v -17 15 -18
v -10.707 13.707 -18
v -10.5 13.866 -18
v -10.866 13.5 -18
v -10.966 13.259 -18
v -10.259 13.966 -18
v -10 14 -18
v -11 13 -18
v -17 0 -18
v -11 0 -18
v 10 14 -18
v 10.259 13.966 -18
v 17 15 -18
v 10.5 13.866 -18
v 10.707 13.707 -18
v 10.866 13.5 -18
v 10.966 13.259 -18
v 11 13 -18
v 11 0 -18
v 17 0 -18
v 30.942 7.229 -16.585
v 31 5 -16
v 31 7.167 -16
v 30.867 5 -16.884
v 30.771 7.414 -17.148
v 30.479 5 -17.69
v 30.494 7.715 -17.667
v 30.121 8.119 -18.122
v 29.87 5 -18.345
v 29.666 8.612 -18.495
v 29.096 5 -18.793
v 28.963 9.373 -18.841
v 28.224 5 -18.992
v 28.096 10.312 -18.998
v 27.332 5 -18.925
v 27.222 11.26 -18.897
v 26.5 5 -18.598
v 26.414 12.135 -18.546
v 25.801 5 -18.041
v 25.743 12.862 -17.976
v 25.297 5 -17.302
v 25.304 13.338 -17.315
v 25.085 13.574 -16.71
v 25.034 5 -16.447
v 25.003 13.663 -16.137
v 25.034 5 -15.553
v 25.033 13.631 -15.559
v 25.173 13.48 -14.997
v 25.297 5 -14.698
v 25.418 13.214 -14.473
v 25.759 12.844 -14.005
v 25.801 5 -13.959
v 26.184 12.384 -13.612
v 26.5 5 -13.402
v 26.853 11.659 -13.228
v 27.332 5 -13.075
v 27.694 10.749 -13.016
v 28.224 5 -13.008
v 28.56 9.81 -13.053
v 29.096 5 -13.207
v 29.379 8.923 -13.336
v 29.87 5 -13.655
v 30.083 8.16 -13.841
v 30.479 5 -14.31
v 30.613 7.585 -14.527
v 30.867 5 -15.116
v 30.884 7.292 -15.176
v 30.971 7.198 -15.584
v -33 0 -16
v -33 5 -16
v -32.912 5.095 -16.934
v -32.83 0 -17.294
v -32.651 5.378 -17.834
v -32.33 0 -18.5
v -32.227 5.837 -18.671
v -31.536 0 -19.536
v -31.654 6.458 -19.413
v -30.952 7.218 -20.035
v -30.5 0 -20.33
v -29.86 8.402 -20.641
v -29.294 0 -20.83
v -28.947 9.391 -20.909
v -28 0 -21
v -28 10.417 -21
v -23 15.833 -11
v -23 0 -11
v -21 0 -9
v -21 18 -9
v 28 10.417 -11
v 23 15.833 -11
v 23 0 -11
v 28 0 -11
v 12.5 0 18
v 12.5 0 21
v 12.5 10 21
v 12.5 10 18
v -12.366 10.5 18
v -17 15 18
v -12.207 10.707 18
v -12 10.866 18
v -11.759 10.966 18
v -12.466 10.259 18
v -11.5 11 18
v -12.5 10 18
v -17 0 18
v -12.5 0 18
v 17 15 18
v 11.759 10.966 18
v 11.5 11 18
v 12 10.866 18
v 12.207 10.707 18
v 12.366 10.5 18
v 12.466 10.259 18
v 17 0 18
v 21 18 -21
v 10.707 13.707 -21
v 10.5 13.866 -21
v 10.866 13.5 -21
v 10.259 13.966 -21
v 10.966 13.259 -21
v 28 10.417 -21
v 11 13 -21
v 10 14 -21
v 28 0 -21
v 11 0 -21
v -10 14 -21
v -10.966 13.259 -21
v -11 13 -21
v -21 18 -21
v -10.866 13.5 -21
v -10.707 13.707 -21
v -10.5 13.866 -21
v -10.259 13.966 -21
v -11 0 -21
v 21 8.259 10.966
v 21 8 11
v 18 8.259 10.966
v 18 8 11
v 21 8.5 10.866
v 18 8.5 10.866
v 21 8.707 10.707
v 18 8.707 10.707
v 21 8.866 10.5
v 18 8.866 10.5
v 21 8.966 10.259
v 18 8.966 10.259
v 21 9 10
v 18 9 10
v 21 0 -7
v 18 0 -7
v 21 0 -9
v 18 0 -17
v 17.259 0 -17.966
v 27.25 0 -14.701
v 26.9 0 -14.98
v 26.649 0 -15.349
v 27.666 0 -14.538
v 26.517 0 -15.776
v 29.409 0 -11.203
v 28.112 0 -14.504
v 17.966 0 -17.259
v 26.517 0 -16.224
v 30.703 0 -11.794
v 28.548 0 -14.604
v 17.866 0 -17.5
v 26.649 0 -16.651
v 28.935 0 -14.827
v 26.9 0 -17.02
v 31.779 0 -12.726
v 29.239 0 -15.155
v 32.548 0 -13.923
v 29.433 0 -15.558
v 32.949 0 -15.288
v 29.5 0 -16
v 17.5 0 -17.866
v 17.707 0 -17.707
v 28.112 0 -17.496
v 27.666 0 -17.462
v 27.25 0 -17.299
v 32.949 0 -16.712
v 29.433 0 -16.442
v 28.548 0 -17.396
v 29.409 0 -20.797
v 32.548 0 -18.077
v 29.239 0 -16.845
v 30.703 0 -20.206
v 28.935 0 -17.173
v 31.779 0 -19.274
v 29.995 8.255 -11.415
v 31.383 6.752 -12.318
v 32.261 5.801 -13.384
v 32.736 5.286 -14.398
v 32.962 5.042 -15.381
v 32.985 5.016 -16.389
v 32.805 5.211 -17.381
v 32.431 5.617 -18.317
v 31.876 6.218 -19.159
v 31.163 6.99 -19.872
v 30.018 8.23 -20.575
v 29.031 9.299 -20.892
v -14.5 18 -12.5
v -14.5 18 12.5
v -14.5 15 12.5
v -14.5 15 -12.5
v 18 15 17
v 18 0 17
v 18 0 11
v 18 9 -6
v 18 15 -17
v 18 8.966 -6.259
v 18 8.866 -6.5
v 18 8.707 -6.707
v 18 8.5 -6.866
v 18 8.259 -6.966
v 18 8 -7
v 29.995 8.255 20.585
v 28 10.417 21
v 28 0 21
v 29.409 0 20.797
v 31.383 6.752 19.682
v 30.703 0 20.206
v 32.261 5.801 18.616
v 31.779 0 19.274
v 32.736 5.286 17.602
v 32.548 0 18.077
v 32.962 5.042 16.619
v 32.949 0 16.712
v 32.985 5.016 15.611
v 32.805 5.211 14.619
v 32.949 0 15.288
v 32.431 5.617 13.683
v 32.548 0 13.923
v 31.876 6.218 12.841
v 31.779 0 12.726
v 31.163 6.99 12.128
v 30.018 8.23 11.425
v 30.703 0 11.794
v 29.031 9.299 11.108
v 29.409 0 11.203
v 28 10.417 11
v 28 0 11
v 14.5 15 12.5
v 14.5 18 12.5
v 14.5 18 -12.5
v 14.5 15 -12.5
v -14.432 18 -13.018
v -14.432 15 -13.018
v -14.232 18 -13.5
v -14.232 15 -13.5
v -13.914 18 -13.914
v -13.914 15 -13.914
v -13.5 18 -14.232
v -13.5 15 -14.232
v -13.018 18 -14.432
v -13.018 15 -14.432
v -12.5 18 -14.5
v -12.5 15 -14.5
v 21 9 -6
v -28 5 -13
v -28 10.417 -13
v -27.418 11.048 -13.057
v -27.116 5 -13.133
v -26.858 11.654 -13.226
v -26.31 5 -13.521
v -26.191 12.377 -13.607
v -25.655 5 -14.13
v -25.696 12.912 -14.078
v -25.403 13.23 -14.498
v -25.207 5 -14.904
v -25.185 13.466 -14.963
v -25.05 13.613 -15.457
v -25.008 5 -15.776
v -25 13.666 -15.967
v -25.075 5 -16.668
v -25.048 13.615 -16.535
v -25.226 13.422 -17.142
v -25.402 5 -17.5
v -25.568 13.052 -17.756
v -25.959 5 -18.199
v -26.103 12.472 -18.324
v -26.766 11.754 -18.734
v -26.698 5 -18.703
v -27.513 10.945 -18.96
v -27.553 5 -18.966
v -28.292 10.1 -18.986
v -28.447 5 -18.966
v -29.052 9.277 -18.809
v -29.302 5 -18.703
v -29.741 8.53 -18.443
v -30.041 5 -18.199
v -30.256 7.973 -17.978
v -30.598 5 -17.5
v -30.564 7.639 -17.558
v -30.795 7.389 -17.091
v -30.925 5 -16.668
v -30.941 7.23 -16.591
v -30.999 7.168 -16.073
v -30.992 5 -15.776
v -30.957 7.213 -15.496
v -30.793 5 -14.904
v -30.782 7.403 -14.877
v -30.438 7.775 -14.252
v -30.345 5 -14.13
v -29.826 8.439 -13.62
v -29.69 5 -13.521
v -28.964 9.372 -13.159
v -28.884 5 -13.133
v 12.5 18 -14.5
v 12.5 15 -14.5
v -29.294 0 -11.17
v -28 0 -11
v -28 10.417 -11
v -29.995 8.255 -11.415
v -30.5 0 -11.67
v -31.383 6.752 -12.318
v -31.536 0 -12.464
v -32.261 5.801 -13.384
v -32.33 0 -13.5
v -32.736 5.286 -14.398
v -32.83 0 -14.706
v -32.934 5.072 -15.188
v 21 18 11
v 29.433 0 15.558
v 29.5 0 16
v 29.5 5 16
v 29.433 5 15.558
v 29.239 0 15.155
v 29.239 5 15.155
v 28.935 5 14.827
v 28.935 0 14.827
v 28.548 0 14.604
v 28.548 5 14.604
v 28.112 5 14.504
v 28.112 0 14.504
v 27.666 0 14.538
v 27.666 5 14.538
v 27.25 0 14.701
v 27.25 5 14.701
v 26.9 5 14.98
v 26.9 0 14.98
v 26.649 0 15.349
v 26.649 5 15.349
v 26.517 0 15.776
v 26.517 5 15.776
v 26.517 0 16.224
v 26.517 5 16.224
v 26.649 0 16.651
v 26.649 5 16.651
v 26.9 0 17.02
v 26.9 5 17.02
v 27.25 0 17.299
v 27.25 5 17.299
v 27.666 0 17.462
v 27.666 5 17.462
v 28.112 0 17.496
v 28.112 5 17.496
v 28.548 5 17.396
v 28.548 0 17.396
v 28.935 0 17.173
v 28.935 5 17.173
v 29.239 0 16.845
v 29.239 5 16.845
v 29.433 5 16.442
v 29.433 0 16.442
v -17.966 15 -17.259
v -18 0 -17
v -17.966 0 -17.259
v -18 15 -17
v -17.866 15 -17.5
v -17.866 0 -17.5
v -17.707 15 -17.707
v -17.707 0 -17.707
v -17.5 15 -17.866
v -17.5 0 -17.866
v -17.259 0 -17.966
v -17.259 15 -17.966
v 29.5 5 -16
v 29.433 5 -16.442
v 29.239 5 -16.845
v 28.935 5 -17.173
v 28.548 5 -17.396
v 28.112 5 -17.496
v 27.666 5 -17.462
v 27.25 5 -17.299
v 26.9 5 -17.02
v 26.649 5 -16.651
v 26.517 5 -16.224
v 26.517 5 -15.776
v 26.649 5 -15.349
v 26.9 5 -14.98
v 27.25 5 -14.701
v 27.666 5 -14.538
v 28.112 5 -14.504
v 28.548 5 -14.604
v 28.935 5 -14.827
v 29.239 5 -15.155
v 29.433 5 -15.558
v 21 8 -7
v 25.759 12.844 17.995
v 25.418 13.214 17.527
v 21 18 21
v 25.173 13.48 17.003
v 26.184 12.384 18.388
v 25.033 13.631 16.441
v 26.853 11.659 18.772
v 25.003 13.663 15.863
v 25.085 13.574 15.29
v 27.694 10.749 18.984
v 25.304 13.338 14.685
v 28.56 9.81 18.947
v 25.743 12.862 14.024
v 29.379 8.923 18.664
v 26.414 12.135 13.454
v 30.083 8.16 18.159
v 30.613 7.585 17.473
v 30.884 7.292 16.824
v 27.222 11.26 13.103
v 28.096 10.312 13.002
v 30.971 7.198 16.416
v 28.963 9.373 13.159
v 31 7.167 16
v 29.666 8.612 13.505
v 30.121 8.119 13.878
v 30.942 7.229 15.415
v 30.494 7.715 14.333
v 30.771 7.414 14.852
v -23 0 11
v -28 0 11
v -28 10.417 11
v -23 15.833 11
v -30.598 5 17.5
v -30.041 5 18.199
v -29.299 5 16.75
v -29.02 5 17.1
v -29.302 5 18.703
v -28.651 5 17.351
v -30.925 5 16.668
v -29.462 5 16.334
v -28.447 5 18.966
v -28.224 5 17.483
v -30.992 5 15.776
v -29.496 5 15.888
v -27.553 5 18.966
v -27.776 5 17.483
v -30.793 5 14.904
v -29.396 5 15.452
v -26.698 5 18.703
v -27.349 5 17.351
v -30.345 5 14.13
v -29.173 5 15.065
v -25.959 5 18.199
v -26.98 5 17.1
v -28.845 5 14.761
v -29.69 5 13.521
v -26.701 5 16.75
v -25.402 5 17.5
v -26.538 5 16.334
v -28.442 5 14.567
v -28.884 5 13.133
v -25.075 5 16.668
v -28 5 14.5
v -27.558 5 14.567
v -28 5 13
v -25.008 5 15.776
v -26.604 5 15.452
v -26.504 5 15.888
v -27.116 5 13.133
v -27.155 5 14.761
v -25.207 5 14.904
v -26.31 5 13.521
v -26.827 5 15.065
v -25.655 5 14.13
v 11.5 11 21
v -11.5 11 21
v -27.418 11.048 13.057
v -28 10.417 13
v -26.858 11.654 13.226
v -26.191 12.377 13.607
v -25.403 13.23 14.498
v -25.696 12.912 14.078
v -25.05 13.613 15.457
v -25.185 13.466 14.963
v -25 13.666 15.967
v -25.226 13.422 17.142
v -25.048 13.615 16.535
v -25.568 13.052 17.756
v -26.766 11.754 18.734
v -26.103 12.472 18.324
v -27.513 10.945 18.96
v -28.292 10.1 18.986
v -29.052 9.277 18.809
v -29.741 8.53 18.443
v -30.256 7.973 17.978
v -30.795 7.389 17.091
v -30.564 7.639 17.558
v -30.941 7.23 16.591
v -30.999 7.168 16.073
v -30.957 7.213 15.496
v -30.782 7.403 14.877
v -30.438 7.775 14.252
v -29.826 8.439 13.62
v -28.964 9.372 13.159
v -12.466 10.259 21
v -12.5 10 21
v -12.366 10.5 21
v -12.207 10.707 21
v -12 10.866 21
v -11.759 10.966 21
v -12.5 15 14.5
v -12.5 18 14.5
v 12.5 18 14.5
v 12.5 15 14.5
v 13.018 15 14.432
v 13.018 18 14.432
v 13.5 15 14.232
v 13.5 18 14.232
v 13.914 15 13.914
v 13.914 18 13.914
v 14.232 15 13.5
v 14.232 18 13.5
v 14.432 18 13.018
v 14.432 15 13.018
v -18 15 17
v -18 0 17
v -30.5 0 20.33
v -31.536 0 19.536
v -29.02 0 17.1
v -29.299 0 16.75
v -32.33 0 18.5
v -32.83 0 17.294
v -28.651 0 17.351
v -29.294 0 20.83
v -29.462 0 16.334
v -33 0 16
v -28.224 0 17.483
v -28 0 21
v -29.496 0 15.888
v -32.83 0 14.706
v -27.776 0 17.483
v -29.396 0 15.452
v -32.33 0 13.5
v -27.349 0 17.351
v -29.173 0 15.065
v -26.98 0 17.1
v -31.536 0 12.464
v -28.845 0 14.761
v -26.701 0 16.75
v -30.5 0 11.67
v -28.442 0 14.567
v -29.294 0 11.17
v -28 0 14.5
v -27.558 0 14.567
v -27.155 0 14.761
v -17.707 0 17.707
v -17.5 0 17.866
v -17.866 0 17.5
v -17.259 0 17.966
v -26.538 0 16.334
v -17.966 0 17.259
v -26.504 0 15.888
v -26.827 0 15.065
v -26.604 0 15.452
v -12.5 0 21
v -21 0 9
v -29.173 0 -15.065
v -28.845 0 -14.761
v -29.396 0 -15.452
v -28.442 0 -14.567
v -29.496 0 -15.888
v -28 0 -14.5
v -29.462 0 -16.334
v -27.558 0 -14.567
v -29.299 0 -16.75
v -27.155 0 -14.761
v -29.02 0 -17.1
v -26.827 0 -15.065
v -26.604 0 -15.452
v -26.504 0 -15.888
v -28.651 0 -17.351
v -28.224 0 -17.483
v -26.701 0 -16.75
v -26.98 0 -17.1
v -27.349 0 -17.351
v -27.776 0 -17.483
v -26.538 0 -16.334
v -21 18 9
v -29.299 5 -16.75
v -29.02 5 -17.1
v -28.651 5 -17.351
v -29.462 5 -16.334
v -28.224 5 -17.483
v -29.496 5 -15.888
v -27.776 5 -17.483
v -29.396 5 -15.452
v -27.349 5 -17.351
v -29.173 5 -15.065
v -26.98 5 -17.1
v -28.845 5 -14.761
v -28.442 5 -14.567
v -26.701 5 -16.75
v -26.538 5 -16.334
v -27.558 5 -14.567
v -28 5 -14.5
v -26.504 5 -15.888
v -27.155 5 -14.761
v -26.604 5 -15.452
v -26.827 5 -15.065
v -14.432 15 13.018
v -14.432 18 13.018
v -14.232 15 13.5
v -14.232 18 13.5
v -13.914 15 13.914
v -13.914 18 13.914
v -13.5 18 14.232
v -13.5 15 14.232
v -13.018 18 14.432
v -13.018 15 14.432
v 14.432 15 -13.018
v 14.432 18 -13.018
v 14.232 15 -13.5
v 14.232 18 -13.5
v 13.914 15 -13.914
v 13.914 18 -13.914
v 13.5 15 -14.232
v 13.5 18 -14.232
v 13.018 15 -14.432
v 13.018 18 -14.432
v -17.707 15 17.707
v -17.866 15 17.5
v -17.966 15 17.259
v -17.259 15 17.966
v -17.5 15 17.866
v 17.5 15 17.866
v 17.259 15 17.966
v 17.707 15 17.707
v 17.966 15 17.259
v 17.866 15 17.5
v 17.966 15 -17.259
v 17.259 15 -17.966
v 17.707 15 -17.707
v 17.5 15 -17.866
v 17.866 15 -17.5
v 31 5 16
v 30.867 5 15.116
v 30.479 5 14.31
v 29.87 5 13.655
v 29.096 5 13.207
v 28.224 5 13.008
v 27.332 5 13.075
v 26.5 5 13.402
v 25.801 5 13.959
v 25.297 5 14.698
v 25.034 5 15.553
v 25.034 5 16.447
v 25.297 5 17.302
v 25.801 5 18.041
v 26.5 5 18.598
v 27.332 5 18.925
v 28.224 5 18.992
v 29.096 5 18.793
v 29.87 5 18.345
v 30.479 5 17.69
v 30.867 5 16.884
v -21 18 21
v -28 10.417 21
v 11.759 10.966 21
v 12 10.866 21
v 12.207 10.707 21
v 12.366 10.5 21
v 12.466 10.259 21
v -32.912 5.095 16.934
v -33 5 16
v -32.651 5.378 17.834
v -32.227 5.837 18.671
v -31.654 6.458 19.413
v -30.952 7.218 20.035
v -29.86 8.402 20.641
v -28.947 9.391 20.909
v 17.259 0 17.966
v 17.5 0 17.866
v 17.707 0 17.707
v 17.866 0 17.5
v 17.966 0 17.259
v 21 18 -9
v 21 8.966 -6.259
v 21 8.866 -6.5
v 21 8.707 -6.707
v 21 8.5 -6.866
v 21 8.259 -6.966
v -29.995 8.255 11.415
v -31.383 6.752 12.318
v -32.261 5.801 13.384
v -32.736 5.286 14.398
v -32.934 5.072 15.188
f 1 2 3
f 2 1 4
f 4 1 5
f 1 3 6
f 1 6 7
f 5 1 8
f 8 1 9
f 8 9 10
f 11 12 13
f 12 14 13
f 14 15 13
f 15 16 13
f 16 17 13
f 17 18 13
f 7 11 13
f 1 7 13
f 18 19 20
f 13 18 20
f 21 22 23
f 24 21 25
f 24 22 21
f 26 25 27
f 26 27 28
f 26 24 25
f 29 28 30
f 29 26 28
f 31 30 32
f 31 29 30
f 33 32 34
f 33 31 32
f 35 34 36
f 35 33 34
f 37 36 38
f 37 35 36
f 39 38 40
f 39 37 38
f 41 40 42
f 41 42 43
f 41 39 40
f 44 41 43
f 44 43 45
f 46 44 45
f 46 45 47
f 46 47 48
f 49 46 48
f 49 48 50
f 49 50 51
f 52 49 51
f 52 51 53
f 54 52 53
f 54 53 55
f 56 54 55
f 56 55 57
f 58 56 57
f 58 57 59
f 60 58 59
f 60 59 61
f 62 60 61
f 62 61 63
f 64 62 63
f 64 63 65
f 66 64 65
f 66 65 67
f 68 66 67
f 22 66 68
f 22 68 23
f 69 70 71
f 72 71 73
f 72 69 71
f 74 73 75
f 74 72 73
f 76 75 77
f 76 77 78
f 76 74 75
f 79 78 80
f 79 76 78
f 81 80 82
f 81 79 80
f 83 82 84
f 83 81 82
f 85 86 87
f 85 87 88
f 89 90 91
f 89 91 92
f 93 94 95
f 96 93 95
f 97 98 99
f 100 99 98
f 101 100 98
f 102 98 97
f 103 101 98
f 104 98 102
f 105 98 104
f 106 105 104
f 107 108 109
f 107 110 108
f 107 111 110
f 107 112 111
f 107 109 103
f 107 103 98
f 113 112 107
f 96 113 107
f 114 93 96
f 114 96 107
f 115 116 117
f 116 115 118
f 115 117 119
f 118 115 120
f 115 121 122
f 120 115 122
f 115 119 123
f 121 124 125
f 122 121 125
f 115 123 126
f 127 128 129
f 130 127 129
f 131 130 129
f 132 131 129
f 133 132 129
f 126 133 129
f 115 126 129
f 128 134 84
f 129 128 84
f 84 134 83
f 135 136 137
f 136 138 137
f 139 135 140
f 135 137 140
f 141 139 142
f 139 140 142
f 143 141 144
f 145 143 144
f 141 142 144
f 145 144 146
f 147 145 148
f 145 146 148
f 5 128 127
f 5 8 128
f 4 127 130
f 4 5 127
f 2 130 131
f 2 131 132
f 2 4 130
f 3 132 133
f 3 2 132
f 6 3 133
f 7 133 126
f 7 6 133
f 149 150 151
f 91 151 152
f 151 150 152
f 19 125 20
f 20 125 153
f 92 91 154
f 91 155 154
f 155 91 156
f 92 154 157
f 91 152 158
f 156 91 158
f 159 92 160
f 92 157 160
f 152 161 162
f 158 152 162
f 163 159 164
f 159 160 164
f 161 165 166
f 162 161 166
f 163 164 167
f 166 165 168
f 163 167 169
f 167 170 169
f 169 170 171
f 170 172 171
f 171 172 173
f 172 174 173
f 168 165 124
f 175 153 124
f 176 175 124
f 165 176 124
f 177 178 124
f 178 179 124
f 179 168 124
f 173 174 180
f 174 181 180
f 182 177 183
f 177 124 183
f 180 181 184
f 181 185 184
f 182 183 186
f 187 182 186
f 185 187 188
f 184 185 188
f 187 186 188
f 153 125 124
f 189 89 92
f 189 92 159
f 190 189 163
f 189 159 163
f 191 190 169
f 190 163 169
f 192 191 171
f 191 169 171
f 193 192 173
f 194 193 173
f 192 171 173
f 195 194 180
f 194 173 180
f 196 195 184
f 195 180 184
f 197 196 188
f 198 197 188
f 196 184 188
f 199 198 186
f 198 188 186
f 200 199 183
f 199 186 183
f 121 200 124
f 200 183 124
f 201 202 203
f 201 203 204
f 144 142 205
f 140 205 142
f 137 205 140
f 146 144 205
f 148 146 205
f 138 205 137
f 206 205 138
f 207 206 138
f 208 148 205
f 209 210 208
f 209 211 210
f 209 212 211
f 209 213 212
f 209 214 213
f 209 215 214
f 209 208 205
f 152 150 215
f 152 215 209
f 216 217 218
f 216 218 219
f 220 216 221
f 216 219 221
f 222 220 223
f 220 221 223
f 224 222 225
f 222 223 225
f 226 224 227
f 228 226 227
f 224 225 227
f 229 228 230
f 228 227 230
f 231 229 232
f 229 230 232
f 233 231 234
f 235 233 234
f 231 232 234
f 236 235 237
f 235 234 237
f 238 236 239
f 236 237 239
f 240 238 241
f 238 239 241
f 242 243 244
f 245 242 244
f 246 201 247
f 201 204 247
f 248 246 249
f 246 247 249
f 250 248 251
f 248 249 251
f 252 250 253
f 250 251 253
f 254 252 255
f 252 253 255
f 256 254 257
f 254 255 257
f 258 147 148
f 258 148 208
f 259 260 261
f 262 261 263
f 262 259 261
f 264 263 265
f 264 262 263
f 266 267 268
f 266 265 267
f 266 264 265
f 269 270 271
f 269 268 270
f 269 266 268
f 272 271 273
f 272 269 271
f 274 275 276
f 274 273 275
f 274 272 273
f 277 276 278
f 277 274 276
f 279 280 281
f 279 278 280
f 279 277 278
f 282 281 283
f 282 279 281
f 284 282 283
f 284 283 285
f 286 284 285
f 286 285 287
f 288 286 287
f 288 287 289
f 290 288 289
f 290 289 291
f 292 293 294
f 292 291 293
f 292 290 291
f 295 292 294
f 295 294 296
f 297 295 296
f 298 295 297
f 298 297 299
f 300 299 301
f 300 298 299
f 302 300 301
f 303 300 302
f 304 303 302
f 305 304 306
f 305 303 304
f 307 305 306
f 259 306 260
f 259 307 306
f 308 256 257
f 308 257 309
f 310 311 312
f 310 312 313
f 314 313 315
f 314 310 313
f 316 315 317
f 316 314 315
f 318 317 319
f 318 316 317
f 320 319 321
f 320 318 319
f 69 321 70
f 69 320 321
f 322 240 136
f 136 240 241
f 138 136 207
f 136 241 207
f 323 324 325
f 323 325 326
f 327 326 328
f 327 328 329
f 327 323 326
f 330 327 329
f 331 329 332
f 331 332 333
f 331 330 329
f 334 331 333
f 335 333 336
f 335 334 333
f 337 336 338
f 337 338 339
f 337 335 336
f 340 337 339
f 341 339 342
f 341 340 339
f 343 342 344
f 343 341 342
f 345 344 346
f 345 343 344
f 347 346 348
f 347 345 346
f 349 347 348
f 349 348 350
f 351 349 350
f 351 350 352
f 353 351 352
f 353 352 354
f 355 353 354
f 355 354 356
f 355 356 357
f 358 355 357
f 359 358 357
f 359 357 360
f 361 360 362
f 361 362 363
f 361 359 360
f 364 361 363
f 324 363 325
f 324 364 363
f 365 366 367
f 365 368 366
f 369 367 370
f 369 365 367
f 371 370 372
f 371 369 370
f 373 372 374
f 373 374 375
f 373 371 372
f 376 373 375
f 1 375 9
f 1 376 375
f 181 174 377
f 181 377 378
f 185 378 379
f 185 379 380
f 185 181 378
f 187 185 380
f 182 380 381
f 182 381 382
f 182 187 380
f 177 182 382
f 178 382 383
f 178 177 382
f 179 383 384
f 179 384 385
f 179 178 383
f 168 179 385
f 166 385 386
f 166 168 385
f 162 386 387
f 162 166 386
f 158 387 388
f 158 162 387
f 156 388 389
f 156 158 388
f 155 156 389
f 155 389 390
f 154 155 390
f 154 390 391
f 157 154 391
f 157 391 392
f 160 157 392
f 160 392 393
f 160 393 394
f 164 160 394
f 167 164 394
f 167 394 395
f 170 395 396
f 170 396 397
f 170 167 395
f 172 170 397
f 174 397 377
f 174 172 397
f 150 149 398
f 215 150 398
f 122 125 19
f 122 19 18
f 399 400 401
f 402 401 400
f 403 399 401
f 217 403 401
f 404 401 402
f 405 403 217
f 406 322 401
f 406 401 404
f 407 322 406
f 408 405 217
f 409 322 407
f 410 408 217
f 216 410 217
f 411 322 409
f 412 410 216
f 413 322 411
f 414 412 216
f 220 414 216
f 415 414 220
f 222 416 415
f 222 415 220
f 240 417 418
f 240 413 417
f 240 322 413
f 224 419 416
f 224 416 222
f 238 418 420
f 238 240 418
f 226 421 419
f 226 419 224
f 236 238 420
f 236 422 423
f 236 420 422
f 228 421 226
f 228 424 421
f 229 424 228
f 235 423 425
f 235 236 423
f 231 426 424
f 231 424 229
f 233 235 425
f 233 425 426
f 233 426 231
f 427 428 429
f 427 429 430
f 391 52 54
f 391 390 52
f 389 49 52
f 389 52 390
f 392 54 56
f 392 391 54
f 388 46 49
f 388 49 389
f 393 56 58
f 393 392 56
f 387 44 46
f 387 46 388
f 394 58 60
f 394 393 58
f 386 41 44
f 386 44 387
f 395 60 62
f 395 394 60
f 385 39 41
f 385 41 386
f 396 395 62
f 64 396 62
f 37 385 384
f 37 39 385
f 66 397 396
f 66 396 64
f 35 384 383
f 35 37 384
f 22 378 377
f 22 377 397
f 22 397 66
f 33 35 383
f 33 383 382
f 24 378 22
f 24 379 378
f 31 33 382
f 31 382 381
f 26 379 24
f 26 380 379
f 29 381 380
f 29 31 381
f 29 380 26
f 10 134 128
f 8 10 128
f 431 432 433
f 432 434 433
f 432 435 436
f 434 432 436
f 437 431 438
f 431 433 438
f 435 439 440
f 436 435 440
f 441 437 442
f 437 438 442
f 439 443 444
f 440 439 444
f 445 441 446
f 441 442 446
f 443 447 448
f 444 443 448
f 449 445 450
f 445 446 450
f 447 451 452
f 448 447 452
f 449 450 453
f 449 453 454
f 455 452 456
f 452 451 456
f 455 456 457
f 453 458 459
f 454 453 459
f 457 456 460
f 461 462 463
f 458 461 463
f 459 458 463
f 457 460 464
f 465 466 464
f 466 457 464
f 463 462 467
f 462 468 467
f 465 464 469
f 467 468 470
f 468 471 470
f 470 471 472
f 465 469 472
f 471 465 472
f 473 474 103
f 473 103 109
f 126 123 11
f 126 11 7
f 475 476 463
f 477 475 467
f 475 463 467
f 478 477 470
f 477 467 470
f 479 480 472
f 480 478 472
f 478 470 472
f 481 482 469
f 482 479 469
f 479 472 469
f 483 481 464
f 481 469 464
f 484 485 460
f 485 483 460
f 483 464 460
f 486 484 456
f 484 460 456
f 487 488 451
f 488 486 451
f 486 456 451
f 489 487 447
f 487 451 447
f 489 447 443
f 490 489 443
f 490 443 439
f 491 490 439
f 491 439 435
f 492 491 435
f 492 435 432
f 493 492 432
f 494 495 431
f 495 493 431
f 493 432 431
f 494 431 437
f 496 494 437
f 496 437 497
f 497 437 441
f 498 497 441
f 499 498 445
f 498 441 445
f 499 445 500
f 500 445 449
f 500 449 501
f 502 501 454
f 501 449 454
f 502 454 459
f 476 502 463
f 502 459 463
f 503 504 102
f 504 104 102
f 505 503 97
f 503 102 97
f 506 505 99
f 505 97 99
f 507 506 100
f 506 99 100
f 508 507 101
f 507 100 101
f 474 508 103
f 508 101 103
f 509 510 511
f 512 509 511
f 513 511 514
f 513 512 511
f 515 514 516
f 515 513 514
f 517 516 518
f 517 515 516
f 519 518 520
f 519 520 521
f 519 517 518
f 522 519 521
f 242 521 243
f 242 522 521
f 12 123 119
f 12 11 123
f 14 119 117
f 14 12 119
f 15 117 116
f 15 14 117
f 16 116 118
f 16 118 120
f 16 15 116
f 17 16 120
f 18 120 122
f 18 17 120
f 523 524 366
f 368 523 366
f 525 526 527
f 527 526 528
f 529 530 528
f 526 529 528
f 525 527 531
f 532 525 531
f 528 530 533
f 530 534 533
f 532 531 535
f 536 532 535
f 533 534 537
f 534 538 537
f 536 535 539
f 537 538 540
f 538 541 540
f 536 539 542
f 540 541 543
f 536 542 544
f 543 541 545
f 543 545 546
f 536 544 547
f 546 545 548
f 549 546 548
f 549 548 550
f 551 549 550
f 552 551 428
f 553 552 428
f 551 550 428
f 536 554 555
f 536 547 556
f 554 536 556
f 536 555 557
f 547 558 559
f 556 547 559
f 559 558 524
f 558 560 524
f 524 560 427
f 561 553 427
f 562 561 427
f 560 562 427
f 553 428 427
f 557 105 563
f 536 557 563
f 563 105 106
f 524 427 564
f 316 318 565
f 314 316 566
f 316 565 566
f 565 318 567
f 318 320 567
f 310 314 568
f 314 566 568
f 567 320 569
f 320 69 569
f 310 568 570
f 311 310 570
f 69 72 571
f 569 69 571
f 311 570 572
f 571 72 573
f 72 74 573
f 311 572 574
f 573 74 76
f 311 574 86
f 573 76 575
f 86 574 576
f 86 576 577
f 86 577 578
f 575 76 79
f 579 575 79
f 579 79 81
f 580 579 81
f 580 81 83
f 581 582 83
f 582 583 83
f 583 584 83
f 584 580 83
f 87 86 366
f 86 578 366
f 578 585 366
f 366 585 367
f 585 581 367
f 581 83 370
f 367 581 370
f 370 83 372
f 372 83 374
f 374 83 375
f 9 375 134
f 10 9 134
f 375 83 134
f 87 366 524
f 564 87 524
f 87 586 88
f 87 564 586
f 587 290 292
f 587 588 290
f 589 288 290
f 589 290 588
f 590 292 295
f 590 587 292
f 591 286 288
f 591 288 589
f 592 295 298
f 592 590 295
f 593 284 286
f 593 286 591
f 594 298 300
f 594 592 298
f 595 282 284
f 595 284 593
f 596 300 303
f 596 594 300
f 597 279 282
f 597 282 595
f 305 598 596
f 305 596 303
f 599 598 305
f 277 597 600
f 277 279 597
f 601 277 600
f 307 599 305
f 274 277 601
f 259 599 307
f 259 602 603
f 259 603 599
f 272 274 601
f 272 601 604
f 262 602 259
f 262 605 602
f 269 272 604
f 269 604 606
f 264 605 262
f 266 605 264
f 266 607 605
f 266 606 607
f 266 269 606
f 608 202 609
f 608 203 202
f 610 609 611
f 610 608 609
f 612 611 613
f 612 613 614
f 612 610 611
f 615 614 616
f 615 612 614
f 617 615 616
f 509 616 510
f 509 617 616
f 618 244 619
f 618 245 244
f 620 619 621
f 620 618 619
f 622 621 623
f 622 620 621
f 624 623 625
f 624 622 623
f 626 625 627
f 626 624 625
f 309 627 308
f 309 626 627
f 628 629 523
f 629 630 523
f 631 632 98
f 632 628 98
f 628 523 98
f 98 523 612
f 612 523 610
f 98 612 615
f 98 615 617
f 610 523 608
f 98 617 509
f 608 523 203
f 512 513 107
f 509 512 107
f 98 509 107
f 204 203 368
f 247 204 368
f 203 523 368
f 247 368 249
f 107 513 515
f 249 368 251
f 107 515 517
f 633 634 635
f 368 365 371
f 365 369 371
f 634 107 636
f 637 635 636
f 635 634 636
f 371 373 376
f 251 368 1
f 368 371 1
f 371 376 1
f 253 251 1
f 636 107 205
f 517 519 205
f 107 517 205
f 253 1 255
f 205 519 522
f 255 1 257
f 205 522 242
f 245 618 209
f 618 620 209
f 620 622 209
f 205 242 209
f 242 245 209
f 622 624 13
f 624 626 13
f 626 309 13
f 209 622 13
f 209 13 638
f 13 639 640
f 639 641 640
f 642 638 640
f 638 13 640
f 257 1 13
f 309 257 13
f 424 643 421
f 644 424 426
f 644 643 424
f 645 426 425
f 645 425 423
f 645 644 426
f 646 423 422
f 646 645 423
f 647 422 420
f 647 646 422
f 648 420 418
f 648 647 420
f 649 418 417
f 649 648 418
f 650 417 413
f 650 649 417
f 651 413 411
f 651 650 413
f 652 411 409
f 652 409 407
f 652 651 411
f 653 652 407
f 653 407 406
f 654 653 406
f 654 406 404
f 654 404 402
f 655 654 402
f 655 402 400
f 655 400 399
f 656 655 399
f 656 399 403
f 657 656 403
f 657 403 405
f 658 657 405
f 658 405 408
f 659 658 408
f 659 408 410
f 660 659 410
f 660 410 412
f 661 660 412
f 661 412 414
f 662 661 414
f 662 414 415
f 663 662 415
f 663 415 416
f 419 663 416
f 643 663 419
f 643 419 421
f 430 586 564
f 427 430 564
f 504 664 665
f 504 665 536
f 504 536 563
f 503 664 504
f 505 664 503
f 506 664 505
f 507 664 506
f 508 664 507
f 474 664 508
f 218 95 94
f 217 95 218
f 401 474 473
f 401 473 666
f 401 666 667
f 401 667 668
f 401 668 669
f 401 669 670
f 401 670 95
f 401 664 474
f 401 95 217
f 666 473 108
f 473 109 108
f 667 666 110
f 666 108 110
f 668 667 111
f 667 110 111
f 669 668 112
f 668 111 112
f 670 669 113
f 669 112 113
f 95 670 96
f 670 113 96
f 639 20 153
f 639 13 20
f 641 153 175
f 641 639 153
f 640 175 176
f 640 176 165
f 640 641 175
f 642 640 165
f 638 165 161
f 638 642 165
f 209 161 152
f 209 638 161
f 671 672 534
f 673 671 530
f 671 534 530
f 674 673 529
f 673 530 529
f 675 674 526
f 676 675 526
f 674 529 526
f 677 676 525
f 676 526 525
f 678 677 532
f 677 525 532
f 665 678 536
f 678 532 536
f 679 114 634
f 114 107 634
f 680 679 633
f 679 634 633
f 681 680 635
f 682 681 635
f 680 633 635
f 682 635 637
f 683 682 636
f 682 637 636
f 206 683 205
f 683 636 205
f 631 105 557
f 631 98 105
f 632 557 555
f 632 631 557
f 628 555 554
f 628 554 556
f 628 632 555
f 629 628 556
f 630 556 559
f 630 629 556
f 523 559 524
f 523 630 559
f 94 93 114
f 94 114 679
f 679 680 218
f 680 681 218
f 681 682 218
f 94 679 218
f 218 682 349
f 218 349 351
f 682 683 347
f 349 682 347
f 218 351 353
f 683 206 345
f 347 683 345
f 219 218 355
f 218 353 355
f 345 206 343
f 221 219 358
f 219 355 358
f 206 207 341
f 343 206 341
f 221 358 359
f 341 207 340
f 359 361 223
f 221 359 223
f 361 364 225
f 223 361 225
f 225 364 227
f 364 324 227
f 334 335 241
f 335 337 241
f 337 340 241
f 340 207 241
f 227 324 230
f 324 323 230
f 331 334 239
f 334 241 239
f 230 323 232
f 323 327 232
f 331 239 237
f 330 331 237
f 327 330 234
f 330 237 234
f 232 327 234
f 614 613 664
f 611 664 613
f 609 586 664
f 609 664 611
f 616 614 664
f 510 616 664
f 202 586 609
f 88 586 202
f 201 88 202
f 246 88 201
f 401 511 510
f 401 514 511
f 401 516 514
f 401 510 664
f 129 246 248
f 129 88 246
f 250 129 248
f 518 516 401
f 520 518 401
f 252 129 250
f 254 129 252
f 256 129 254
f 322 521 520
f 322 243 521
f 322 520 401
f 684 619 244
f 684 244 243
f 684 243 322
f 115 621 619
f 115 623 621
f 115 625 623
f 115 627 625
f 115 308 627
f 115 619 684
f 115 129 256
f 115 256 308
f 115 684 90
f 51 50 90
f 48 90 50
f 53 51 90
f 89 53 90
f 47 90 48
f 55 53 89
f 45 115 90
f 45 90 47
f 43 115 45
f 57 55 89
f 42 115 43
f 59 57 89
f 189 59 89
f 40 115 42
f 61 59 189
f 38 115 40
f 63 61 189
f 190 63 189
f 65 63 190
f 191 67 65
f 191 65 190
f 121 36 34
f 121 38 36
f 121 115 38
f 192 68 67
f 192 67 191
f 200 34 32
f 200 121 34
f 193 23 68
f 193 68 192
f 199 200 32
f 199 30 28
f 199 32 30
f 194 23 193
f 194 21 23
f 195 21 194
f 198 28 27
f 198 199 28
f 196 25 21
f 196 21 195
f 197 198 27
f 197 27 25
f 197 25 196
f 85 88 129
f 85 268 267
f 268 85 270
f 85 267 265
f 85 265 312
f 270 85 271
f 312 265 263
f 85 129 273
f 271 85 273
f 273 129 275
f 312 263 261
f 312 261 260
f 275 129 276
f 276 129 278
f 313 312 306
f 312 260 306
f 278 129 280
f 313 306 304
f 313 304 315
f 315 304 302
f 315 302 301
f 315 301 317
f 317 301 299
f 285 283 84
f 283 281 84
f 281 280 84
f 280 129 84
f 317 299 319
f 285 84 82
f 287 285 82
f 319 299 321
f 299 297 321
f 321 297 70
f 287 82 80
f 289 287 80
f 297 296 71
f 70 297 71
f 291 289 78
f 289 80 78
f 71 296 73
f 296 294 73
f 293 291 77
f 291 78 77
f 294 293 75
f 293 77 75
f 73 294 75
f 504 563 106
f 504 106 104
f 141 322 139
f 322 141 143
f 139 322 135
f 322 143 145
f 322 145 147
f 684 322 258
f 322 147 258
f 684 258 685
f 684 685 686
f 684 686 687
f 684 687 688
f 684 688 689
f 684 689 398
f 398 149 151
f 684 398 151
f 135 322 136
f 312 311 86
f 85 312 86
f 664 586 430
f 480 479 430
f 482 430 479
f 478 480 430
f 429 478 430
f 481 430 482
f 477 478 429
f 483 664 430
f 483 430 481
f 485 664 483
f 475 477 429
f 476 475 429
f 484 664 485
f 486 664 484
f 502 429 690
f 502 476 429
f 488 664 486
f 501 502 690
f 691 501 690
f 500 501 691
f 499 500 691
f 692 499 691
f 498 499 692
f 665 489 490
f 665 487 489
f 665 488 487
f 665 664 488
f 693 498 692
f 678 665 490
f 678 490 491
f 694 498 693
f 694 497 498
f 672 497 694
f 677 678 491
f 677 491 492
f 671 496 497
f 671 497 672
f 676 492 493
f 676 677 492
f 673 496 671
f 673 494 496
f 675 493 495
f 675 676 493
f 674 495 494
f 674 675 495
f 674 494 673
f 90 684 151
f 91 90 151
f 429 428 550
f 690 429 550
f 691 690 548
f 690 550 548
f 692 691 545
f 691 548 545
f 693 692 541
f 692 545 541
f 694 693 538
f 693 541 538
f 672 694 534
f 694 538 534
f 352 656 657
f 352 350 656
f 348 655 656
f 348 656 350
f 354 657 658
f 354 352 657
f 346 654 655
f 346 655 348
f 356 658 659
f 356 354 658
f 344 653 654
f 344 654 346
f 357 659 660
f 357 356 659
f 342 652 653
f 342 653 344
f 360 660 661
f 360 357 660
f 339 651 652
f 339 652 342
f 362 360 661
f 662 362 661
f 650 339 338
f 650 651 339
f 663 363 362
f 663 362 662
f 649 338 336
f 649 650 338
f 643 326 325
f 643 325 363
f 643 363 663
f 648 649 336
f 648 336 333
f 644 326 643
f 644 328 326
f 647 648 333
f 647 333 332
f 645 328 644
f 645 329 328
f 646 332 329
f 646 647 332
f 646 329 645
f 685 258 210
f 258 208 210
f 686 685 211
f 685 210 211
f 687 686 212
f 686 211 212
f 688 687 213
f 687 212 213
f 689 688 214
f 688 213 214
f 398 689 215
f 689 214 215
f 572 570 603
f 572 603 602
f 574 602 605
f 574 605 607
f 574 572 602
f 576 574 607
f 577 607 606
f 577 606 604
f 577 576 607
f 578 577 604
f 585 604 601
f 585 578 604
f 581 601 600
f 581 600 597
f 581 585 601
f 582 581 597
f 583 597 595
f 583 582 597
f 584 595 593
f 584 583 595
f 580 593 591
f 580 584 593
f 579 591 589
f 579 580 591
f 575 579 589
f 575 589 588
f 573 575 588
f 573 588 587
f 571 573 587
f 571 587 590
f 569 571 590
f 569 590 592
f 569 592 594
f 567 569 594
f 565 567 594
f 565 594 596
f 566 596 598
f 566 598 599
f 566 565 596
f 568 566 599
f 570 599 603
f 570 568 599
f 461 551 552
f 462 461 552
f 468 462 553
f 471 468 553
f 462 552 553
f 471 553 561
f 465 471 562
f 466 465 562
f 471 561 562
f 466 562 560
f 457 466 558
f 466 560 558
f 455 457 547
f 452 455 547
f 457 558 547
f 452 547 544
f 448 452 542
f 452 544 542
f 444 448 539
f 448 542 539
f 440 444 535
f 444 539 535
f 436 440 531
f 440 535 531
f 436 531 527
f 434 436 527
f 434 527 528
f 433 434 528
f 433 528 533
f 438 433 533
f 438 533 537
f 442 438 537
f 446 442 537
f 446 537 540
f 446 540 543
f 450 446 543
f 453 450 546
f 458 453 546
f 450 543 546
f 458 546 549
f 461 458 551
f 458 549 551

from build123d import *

# Parameters (mm, degrees)
SKETCH1_W             = 36
SKETCH1_H             = 36
BOSS_EXTRUDE1_DEPTH   = 15
SHELL1_T              = 3
CUT_EXTRUDE1_REACH    = 52.289
SKETCH2_W             = 25
SKETCH2_H             = 11
CUT_EXTRUDE2_REACH    = 52.289
SKETCH3_W             = 18
SKETCH3_H             = 9
CUT_EXTRUDE3_REACH    = 36.728
SKETCH5_W             = 29
SKETCH5_H             = 29
FILLET1_R             = 2
CUT_EXTRUDE4_REACH    = 52.289
SKETCH6_W             = 22
SKETCH6_H             = 14
FILLET2_R             = 1
SKETCH9_W             = 12
SKETCH9_H             = 10
BOSS_EXTRUDE3_DEPTH   = 5
BOSS_EXTRUDE4_DEPTH   = 10
SKETCH11_R            = 1.5
CUT_EXTRUDE5_DEPTH    = 5
CUT_EXTRUDE6_REACH    = 43.219
SKETCH12_R            = 3
CUT_EXTRUDE7_REACH    = 45.058
MIRROR3_OUTLINE_R     = 1.5
MIRROR3_DEPTH         = 5
MIRROR3_START         = 5
MIRROR3_2_OUTLINE_R   = 3
MIRROR3_2_DEPTH       = 13
MIRROR3_START_2       = 27.639914186
MIRROR3_3_OUTLINE_W   = 20
MIRROR3_3_OUTLINE_H   = 12
MIRROR3_3_OUTLINE_H_2 = 11
MIRROR3_3_DEPTH       = 9.360085814
CHAMFER1_SIZE         = 2
FILLET3_R             = 1


with BuildPart() as part:
    # Sketch1 → Boss-Extrude1 (new body)
    with BuildSketch(Plane(origin=(0, 0, 0), x_dir=(1, 0, 0), z_dir=(0, 1, 0))):
        Rectangle(SKETCH1_W, SKETCH1_H)
    extrude(amount=BOSS_EXTRUDE1_DEPTH)

    # Shell1
    shell1_openings = [part.faces().sort_by_distance(p)[0] for p in [
        (0, 0, 0),
    ]]
    offset(amount=SHELL1_T, openings=shell1_openings, kind=Kind.INTERSECTION)

    # Sketch2 → Cut-Extrude1 (cut, up to next)
    with BuildSketch(Plane.XY.offset(21), mode=Mode.PRIVATE) as cut_extrude1_sk1:
        with Locations((0, 5.5)):
            Rectangle(SKETCH2_W, SKETCH2_H)
    cut_extrude1_tool1 = extrude(cut_extrude1_sk1.sketch, amount=-CUT_EXTRUDE1_REACH, mode=Mode.PRIVATE) & part.part
    add(cut_extrude1_tool1.solids().sort_by_distance((0, 5.5, 21))[0], mode=Mode.SUBTRACT)

    # Sketch3 → Cut-Extrude2 (cut, up to next)
    with BuildSketch(Plane(origin=(21, 0, 0), x_dir=(0, 0, -1), z_dir=(1, 0, 0)), mode=Mode.PRIVATE) as cut_extrude2_sk1:
        with Locations((-2, 4.5)):
            Rectangle(SKETCH3_W, SKETCH3_H)
    cut_extrude2_tool1 = extrude(cut_extrude2_sk1.sketch, amount=-CUT_EXTRUDE2_REACH, mode=Mode.PRIVATE) & part.part
    add(cut_extrude2_tool1.solids().sort_by_distance((21, 4.5, 2))[0], mode=Mode.SUBTRACT)

    # Sketch5 → Cut-Extrude3 (cut, up to next)
    with BuildSketch(Plane(origin=(0, 18, 0), x_dir=(1, 0, 0), z_dir=(0, 1, 0)), mode=Mode.PRIVATE) as cut_extrude3_sk1:
        Rectangle(SKETCH5_W, SKETCH5_H)
    cut_extrude3_tool1 = extrude(cut_extrude3_sk1.sketch, amount=-CUT_EXTRUDE3_REACH, mode=Mode.PRIVATE) & part.part
    add(cut_extrude3_tool1.solids().sort_by_distance((0, 18, 0))[0], mode=Mode.SUBTRACT)

    # Fillet1
    fillet1_edges = [part.edges().sort_by_distance(p)[0] for p in [
        (14.5, 16.5, -14.5),
        (14.5, 16.5, 14.5),
        (-14.5, 16.5, 14.5),
        (-14.5, 16.5, -14.5),
    ]]
    fillet(fillet1_edges, radius=FILLET1_R)

    # Sketch6 → Cut-Extrude4 (cut, up to next)
    with BuildSketch(Plane(origin=(0, 0, -21), x_dir=(-1, 0, 0), z_dir=(0, 0, -1)), mode=Mode.PRIVATE) as cut_extrude4_sk1:
        with Locations((0, 7)):
            Rectangle(SKETCH6_W, SKETCH6_H)
    cut_extrude4_tool1 = extrude(cut_extrude4_sk1.sketch, amount=-CUT_EXTRUDE4_REACH, mode=Mode.PRIVATE) & part.part
    add(cut_extrude4_tool1.solids().sort_by_distance((0, 7, -21))[0], mode=Mode.SUBTRACT)

    # Fillet2
    fillet2_edges = [part.edges().sort_by_distance(p)[0] for p in [
        (-11, 14, -19.5),
        (11, 14, -19.5),
        (12.5, 11, 19.5),
        (-12.5, 11, 19.5),
        (19.5, 9, 11),
        (19.5, 9, -7),
    ]]
    fillet(fillet2_edges, radius=FILLET2_R)

    # Sketch9 → Boss-Extrude3 (add)
    with BuildSketch(Plane.XZ):
        with Locations((-27, 16)):
            Rectangle(SKETCH9_W, SKETCH9_H)
    boss_extrude3 = extrude(amount=-BOSS_EXTRUDE3_DEPTH)

    # Sketch10 → Boss-Extrude4 (add)
    with BuildSketch(Plane.XY.offset(21)):
        Polygon((-21, 18), (-33, 5), (-21, 5), align=None)
    boss_extrude4 = extrude(amount=-BOSS_EXTRUDE4_DEPTH)

    # Sketch11 → Cut-Extrude5 (cut)
    with BuildSketch(Plane.XZ):
        with Locations(Location((-28, 16, 0), (0, 0, 270))):
            Circle(SKETCH11_R)
    cut_extrude5 = extrude(amount=-CUT_EXTRUDE5_DEPTH, mode=Mode.SUBTRACT)

    # Cut-Extrude6: up to this plane
    cut_extrude6_end = Plane(origin=(-21, 18, -6.691806013), z_dir=(-0.7348034446274878, 0.678280102733066, 0))
    # Sketch12 → Cut-Extrude6 (cut, up to the surface)
    with BuildSketch(Plane.XZ.offset(-5), mode=Mode.PRIVATE) as cut_extrude6_sk1:
        with Locations(Location((-28, 16, 0), (0, 0, 270))):
            Circle(SKETCH12_R)
    cut_extrude6_tool1 = split(extrude(cut_extrude6_sk1.sketch, amount=-CUT_EXTRUDE6_REACH, mode=Mode.PRIVATE), bisect_by=cut_extrude6_end, keep=Keep.BOTH, mode=Mode.PRIVATE)
    cut_extrude6 = cut_extrude6_tool1.solids().sort_by_distance((-28, 5, 16))[0]
    add(cut_extrude6, mode=Mode.SUBTRACT)

    # Cut-Extrude7: up to this plane
    cut_extrude7_end = Plane(origin=(-21, 18, -6.691806013), z_dir=(-0.7348034446274878, 0.678280102733066, 0))
    # Sketch13 → Cut-Extrude7 (cut, up to the surface)
    with BuildSketch(Plane.XZ, mode=Mode.PRIVATE) as cut_extrude7_sk1:
        with BuildLine():
            ThreePointArc((-33, 16), (-31.535533906, 19.535533906), (-28, 21))
            Line((-28, 21), (-33, 21))
            Line((-33, 21), (-33, 16))
        make_face()
    cut_extrude7_tool1 = split(extrude(cut_extrude7_sk1.sketch, amount=-CUT_EXTRUDE7_REACH, mode=Mode.PRIVATE), bisect_by=cut_extrude7_end, keep=Keep.BOTH, mode=Mode.PRIVATE)
    # Sketch13 → Cut-Extrude7 (cut, up to the surface)
    with BuildSketch(Plane.XZ, mode=Mode.PRIVATE) as cut_extrude7_sk2:
        with BuildLine():
            Line((-33, 11), (-28, 11))
            ThreePointArc((-28, 11), (-31.535533906, 12.464466094), (-33, 16))
            Line((-33, 16), (-33, 11))
        make_face()
    cut_extrude7_tool2 = split(extrude(cut_extrude7_sk2.sketch, amount=-CUT_EXTRUDE7_REACH, mode=Mode.PRIVATE), bisect_by=cut_extrude7_end, keep=Keep.BOTH, mode=Mode.PRIVATE)
    cut_extrude7 = cut_extrude7_tool1.solids().sort_by_distance((-31.88316, 0, 19.88316))[0] + cut_extrude7_tool2.solids().sort_by_distance((-31.88316, 0, 12.11684))[0]
    add(cut_extrude7, mode=Mode.SUBTRACT)

    # Mirror1: Boss-Extrude3, Boss-Extrude4, Cut-Extrude5, Cut-Extrude6, Cut-Extrude7 across plane
    add(boss_extrude3.mirror(Plane.XY))
    add(boss_extrude4.mirror(Plane.XY))
    add(cut_extrude5.mirror(Plane.XY), mode=Mode.SUBTRACT)
    add(cut_extrude6.mirror(Plane.XY), mode=Mode.SUBTRACT)
    add(cut_extrude7.mirror(Plane.XY), mode=Mode.SUBTRACT)

    # Mirror3: read off the stored shape, not the designer's step
    # Mirror3 outline → Mirror3 (add)
    # profile 1 of 2: a face of its own
    with BuildSketch(Plane(origin=(0, 0, 0), x_dir=(1, 0, 0), z_dir=(0, 1, 0))):
        with BuildLine():
            Line((21, 21), (21, 11))
            Line((21, 11), (28, 11))
            ThreePointArc((28, 11), (33, 16), (28, 21))
            Line((28, 21), (21, 21))
        make_face()
        with Locations((28, 16)):
            Circle(MIRROR3_OUTLINE_R, mode=Mode.SUBTRACT)
    # profile 2 of 2: a face of its own
    with BuildSketch(Plane(origin=(0, 0, 0), x_dir=(1, 0, 0), z_dir=(0, 1, 0))):
        with BuildLine():
            Line((28, -11), (21, -11))
            Line((21, -11), (21, -21))
            Line((21, -21), (28, -21))
            ThreePointArc((28, -21), (33, -16), (28, -11))
        make_face()
        with Locations((28, -16)):
            Circle(MIRROR3_OUTLINE_R, mode=Mode.SUBTRACT)
    extrude(amount=MIRROR3_DEPTH)

    # Mirror3 2 outline → Mirror3 2 (add)
    # profile 1 of 2: a face of its own
    with BuildSketch(Plane(origin=(0, 0, 0), x_dir=(1, 0, 0), z_dir=(0, 1, 0)).offset(MIRROR3_START)):
        with BuildLine():
            Line((21, 21), (21, 11))
            Line((21, 11), (28, 11))
            ThreePointArc((28, 11), (33, 16), (28, 21))
            Line((28, 21), (21, 21))
        make_face()
        with Locations((28, 16)):
            Circle(MIRROR3_2_OUTLINE_R, mode=Mode.SUBTRACT)
    # profile 2 of 2: a face of its own
    with BuildSketch(Plane(origin=(0, 0, 0), x_dir=(1, 0, 0), z_dir=(0, 1, 0)).offset(MIRROR3_START)):
        with BuildLine():
            Line((28, -11), (21, -11))
            Line((21, -11), (21, -21))
            Line((21, -21), (28, -21))
            ThreePointArc((28, -21), (33, -16), (28, -11))
        make_face()
        with Locations((28, -16)):
            Circle(MIRROR3_2_OUTLINE_R, mode=Mode.SUBTRACT)
    extrude(amount=MIRROR3_2_DEPTH)

    # Mirror3 3 outline → Mirror3 3 (cut)
    with BuildSketch(Plane(origin=(0, 0, 0), x_dir=(0.6782801027330657, -0.734803444627488, 0), z_dir=(0.7348034446274879, 0.6782801027330659, 0)).offset(MIRROR3_START_2)):
        with Locations((10, 17)):
            Rectangle(MIRROR3_3_OUTLINE_W, MIRROR3_3_OUTLINE_H)
        with Locations((10, -16.5)):
            Rectangle(MIRROR3_3_OUTLINE_W, MIRROR3_3_OUTLINE_H_2)
    extrude(amount=MIRROR3_3_DEPTH, mode=Mode.SUBTRACT)

    # Chamfer1
    chamfer1_edges = [part.edges().sort_by_distance(p)[0] for p in [
        (-21, 9, 11),
        (-21, 9, -11),
        (21, 9, -11),
    ]]
    chamfer(chamfer1_edges, length=CHAMFER1_SIZE)

    # Fillet3
    fillet3_edges = [part.edges().sort_by_distance(p)[0] for p in [
        (18, 7.5, 18),
        (18, 7.5, -18),
        (-18, 7.5, -18),
        (-18, 7.5, 18),
    ]]
    fillet(fillet3_edges, radius=FILLET3_R)


solid = part.part
